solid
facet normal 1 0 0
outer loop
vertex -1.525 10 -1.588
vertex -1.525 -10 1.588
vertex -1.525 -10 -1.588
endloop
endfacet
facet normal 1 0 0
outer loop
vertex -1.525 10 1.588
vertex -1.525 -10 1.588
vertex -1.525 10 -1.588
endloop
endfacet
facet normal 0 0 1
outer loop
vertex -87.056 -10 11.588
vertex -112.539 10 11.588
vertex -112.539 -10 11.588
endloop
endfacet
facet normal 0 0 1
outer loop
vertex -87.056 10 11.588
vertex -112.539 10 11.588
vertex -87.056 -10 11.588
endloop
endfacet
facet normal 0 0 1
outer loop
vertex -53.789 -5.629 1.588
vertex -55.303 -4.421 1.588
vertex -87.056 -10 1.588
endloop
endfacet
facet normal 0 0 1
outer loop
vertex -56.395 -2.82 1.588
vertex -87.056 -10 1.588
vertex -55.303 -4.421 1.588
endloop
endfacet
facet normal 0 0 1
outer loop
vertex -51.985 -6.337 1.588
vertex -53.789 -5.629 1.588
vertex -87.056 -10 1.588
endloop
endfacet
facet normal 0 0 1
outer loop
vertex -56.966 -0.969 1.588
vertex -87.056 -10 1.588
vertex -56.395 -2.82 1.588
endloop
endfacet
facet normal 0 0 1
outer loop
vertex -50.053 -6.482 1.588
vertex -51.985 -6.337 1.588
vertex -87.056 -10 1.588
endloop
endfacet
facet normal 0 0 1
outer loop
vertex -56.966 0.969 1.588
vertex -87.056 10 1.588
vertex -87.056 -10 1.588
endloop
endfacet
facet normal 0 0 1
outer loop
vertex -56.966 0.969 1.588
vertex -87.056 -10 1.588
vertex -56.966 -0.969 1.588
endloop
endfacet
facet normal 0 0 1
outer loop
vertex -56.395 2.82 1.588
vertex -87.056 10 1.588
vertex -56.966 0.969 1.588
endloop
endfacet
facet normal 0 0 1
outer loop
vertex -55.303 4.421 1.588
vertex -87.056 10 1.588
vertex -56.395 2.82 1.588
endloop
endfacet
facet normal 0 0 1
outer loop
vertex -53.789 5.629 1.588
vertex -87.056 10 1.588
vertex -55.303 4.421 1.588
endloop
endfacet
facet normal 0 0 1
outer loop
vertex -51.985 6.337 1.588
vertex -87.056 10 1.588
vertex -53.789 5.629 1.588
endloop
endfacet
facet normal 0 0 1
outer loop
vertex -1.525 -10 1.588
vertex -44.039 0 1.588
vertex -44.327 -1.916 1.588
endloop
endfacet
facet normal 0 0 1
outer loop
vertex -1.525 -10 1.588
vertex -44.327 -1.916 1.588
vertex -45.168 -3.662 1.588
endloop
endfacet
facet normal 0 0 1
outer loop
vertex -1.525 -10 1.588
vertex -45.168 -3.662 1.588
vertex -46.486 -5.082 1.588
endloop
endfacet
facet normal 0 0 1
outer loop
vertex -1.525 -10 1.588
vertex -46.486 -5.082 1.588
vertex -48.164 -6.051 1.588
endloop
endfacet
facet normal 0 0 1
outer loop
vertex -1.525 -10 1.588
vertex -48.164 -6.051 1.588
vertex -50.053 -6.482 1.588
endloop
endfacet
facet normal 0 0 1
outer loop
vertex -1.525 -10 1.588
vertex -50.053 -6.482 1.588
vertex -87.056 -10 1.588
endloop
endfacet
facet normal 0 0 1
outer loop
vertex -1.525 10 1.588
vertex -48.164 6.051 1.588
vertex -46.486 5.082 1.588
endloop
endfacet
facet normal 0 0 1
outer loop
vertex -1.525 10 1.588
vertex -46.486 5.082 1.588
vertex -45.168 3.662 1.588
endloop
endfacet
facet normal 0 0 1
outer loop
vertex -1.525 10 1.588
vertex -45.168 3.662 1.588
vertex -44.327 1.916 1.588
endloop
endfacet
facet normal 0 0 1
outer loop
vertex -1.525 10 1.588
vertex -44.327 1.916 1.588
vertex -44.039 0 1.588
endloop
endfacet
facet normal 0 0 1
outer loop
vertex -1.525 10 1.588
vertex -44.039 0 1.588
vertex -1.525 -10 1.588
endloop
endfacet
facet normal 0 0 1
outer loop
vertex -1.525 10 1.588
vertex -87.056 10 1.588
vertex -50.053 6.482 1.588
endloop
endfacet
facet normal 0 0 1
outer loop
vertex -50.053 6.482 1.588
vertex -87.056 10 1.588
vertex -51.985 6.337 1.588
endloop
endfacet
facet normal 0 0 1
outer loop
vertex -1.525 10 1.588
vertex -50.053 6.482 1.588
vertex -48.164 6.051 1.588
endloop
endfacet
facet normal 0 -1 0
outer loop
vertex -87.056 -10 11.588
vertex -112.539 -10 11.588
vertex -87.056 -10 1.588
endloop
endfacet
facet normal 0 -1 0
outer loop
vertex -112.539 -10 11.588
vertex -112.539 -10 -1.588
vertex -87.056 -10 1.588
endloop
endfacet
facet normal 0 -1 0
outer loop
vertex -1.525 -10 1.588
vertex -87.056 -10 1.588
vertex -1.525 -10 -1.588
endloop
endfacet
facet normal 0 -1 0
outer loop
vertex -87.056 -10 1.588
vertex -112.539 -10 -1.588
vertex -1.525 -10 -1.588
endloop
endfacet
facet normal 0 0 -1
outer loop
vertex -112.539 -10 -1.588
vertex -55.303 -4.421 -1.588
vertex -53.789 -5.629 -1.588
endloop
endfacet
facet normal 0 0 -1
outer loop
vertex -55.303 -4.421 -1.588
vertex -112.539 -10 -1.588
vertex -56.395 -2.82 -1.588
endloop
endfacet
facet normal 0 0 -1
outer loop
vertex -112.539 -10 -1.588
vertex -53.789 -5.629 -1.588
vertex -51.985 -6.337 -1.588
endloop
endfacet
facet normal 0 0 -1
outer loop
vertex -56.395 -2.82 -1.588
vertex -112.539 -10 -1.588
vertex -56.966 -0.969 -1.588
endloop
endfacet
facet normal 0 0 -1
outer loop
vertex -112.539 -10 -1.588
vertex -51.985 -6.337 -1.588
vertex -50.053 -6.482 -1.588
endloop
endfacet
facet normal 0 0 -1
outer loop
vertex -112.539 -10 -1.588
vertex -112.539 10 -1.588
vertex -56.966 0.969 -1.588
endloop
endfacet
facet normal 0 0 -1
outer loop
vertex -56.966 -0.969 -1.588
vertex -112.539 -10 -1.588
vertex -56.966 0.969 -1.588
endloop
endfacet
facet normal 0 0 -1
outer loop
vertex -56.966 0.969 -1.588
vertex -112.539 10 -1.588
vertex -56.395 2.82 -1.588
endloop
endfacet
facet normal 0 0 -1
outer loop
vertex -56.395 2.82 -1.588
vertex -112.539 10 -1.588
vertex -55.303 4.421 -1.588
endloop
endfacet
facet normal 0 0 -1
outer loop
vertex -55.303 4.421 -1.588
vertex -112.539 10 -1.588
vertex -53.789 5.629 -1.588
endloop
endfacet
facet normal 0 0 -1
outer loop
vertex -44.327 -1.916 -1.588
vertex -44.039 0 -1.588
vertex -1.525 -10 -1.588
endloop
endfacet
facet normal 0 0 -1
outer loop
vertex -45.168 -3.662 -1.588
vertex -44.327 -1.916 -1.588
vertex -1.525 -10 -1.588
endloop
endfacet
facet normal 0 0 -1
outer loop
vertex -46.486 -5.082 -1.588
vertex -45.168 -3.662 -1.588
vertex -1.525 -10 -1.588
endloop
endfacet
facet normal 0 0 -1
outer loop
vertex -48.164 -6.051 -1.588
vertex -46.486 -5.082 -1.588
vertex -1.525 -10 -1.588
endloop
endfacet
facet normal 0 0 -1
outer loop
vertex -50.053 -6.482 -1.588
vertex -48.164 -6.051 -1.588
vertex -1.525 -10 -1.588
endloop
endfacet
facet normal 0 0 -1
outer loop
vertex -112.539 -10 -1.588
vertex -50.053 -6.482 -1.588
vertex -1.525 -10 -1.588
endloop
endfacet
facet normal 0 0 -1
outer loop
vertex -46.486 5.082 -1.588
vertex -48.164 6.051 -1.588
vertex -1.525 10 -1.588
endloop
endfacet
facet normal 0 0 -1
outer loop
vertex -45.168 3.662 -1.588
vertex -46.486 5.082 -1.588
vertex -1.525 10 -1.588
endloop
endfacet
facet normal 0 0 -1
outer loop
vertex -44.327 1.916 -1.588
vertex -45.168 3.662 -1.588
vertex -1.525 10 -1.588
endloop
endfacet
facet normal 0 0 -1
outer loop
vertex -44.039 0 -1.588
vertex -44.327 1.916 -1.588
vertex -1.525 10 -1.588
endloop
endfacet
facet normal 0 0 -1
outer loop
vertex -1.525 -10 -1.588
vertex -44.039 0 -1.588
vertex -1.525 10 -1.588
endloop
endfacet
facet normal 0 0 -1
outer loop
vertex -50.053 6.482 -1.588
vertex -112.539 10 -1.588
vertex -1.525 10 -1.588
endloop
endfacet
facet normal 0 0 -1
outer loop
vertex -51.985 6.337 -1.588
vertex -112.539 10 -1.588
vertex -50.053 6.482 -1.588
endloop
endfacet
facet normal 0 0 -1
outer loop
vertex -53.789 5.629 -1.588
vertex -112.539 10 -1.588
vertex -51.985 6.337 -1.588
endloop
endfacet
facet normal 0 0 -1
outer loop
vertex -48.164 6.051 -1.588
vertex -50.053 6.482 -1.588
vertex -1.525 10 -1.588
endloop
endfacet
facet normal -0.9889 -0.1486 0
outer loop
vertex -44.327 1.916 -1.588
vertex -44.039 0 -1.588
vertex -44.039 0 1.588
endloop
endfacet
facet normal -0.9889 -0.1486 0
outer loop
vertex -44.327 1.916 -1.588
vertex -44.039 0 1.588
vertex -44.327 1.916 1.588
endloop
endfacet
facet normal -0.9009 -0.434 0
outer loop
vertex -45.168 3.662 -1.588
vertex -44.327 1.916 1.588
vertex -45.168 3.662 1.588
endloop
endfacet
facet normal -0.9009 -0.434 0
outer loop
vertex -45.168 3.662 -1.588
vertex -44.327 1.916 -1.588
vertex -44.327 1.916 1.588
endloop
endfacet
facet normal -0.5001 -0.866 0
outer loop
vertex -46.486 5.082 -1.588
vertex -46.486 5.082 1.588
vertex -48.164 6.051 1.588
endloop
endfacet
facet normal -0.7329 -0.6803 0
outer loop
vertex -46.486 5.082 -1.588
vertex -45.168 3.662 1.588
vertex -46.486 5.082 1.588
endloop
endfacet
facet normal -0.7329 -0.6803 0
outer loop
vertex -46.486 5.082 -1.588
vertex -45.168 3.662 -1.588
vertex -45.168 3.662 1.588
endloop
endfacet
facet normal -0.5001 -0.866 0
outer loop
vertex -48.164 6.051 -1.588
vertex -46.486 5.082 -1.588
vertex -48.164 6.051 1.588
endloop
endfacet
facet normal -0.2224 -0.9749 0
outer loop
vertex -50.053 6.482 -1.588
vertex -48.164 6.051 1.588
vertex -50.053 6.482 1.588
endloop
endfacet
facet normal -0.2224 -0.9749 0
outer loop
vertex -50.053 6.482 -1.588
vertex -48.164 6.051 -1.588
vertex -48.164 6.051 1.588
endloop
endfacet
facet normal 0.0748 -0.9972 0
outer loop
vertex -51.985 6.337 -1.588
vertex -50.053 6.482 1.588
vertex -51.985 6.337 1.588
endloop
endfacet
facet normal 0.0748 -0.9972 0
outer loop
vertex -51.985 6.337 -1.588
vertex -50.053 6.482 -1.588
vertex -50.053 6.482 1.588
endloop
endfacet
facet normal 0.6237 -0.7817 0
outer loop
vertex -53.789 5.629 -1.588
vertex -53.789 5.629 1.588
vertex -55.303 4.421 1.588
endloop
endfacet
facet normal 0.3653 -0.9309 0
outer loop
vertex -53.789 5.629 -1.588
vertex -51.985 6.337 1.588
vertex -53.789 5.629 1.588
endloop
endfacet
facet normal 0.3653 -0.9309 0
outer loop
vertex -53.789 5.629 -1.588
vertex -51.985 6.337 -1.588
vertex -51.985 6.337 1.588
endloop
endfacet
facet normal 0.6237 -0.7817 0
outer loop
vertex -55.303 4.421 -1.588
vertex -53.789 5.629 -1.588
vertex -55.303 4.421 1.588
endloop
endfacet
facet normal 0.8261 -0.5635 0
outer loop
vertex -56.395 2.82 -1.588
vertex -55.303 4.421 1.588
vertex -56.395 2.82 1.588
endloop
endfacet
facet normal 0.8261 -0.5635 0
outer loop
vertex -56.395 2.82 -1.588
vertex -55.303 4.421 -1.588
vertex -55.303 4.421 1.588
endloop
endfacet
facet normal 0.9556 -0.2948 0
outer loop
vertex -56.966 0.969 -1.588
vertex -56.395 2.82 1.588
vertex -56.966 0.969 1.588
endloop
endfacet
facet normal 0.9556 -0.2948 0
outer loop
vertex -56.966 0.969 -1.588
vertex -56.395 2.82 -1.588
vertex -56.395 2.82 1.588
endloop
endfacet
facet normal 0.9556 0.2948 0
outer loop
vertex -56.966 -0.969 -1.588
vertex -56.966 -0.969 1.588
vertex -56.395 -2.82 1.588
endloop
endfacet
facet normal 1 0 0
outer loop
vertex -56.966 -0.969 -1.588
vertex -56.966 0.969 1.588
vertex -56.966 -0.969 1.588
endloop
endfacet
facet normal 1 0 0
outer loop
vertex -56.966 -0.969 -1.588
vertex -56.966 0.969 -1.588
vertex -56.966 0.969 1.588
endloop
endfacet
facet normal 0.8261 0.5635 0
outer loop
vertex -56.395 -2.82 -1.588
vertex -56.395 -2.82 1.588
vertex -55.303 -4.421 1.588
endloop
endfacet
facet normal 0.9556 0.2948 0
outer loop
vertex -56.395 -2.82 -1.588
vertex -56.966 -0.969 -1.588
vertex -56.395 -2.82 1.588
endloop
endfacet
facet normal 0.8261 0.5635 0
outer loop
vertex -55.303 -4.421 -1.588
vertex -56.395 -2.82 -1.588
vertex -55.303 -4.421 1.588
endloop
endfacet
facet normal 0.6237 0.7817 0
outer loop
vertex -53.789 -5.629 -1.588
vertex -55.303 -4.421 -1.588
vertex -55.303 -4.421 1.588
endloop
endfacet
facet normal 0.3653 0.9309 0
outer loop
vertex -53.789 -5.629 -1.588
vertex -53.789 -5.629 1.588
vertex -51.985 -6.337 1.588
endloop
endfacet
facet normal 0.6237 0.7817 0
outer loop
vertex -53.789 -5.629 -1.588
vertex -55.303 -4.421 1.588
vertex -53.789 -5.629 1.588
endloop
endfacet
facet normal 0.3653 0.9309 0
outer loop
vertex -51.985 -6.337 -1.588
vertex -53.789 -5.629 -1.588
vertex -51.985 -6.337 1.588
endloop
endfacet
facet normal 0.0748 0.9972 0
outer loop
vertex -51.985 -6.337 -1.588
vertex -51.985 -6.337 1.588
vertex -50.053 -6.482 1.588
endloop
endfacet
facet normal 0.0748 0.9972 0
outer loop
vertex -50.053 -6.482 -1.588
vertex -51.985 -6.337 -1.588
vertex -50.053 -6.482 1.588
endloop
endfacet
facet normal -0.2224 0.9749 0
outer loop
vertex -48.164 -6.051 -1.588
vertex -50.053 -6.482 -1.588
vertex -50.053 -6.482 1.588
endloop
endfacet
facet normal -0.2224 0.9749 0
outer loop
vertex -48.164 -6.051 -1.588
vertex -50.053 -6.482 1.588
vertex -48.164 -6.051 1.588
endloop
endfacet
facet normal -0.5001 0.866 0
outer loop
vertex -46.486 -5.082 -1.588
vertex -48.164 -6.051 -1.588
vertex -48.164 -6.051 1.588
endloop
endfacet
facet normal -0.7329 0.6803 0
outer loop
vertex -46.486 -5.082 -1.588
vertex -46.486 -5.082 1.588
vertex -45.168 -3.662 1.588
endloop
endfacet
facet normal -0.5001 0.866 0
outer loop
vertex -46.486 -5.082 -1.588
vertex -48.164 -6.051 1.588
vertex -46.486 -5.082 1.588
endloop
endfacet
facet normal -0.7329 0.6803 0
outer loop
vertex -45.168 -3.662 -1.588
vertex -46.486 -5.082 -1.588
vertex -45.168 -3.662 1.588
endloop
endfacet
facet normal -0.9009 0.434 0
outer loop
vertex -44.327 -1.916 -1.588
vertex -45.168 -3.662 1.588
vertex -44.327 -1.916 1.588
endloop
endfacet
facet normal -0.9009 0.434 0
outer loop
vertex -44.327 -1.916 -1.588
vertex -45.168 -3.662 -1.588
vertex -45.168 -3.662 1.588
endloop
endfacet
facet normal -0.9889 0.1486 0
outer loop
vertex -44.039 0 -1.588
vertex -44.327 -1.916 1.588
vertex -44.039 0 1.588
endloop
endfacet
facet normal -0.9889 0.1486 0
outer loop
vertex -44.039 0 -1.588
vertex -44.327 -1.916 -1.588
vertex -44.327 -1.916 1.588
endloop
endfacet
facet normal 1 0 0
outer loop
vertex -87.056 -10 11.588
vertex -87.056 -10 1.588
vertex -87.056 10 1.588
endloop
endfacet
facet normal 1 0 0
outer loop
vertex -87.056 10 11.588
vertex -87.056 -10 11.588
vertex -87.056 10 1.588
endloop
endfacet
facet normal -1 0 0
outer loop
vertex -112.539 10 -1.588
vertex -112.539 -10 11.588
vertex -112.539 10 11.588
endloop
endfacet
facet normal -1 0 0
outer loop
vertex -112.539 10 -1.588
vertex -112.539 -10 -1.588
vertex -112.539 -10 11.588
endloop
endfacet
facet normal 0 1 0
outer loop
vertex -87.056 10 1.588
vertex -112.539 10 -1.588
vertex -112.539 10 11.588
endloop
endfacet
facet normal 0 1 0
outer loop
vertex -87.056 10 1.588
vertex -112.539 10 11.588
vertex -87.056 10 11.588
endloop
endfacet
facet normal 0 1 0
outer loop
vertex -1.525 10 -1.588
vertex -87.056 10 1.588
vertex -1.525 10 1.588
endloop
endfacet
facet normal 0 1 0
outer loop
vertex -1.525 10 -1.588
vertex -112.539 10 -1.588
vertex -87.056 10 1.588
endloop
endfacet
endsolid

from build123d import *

# Parameters (mm, degrees)
SKETCH1_W               = 111.013561953
SKETCH1_H               = 10
BOSS_EXTRUDE3_DEPTH     = 1.5875
CUT_EXTRUDE1_DEPTH      = 114.026682648
CUT_EXTRUDE1_DEPTH_BACK = 114.026682648
SKETCH2_R               = 6.5
SKETCH3_W               = 25.483030165
SKETCH3_H               = 20
BOSS_EXTRUDE4_DEPTH     = 10


with BuildPart() as part:
    # Sketch1 → Boss-Extrude3 (new, symmetric)
    with BuildSketch(Plane.XY):
        with Locations((-57.031880671, 5)):
            Rectangle(SKETCH1_W, SKETCH1_H)
        with Locations((-57.031880671, -5)):
            Rectangle(SKETCH1_W, SKETCH1_H)
    extrude(amount=BOSS_EXTRUDE3_DEPTH, both=True)

    # Sketch2 → Cut-Extrude1 (cut, two sides: drawn at the far end of the back side and taken through both)
    with BuildSketch(Plane.XY.offset(1.5875).offset(-CUT_EXTRUDE1_DEPTH_BACK)):
        with Locations((-50.538661647, 0)):
            Circle(SKETCH2_R)
    extrude(amount=CUT_EXTRUDE1_DEPTH + CUT_EXTRUDE1_DEPTH_BACK, mode=Mode.SUBTRACT)

    # Sketch3 → Boss-Extrude4 (add)
    with BuildSketch(Plane.XY.offset(1.5875)):
        with Locations((-99.797146565, 0)):
            Rectangle(SKETCH3_W, SKETCH3_H)
    extrude(amount=BOSS_EXTRUDE4_DEPTH)


solid = part.part
